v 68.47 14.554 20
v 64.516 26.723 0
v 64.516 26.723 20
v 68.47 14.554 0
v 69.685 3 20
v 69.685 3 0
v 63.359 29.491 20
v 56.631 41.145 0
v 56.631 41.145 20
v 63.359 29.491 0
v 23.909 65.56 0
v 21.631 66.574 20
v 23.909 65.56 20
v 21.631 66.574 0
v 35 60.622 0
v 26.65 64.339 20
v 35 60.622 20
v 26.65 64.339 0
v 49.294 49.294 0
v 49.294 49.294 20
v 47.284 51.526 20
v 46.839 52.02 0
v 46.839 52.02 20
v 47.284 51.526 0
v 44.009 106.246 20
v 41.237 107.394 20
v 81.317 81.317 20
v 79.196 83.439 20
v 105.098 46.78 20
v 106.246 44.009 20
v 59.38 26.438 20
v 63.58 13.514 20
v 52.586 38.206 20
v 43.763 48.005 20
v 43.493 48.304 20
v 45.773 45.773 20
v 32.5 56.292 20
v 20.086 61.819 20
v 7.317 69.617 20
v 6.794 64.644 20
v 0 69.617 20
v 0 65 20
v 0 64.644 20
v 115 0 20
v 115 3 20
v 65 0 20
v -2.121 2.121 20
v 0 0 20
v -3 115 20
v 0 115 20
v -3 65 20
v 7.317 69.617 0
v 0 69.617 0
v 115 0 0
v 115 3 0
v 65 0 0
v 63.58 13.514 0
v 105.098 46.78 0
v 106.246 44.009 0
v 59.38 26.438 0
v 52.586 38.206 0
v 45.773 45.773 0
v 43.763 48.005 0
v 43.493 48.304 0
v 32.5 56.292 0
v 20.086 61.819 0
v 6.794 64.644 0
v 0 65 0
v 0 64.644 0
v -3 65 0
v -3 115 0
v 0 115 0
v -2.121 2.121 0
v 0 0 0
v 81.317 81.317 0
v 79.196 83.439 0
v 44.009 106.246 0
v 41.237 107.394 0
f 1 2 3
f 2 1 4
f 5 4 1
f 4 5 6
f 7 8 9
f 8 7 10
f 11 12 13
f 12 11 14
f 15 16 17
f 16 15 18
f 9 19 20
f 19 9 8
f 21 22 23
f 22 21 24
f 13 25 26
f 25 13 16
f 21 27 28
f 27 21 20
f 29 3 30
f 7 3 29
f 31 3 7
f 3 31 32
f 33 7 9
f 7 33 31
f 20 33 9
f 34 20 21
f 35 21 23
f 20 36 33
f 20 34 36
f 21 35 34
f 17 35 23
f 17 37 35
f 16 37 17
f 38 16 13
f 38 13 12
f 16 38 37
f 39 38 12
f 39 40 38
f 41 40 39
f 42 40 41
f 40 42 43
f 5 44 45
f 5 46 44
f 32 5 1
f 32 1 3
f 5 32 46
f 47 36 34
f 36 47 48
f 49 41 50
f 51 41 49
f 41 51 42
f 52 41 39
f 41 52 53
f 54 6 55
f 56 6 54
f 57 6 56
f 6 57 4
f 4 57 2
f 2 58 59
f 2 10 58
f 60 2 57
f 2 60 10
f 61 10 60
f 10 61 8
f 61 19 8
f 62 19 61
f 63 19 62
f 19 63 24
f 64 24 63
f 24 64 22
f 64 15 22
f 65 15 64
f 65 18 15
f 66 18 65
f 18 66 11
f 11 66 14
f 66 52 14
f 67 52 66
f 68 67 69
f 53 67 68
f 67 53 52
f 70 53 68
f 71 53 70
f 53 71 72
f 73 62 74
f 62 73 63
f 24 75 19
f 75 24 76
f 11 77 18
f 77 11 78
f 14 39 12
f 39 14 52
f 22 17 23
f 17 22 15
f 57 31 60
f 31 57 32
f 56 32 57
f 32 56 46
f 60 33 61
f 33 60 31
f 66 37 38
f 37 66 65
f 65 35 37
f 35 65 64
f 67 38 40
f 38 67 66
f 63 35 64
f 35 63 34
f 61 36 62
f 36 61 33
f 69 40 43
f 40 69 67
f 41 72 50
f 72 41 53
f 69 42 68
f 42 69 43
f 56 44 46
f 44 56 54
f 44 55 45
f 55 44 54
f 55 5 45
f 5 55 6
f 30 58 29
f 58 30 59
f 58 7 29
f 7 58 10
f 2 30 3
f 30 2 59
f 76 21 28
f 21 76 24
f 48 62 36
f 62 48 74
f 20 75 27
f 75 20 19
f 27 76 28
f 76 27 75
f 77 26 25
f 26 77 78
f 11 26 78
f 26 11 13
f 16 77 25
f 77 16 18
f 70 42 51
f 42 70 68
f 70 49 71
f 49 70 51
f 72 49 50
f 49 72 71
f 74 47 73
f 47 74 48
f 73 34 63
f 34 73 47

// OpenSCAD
module courbe() {
	intersection() {
		difference() {
			cylinder(20, r=70);
			cylinder(20, r=65);
		}
		cube([70, 70, 20]);
	}
}

module pales() {
	for (i=[0:1:4]){
		rotate([0,0,90*i/4])
			translate([65,0,0])
				cube([50,3,20]);
	}
	rotate([0,0,45])cube([65,3,20]);
}
				
courbe();
pales();
